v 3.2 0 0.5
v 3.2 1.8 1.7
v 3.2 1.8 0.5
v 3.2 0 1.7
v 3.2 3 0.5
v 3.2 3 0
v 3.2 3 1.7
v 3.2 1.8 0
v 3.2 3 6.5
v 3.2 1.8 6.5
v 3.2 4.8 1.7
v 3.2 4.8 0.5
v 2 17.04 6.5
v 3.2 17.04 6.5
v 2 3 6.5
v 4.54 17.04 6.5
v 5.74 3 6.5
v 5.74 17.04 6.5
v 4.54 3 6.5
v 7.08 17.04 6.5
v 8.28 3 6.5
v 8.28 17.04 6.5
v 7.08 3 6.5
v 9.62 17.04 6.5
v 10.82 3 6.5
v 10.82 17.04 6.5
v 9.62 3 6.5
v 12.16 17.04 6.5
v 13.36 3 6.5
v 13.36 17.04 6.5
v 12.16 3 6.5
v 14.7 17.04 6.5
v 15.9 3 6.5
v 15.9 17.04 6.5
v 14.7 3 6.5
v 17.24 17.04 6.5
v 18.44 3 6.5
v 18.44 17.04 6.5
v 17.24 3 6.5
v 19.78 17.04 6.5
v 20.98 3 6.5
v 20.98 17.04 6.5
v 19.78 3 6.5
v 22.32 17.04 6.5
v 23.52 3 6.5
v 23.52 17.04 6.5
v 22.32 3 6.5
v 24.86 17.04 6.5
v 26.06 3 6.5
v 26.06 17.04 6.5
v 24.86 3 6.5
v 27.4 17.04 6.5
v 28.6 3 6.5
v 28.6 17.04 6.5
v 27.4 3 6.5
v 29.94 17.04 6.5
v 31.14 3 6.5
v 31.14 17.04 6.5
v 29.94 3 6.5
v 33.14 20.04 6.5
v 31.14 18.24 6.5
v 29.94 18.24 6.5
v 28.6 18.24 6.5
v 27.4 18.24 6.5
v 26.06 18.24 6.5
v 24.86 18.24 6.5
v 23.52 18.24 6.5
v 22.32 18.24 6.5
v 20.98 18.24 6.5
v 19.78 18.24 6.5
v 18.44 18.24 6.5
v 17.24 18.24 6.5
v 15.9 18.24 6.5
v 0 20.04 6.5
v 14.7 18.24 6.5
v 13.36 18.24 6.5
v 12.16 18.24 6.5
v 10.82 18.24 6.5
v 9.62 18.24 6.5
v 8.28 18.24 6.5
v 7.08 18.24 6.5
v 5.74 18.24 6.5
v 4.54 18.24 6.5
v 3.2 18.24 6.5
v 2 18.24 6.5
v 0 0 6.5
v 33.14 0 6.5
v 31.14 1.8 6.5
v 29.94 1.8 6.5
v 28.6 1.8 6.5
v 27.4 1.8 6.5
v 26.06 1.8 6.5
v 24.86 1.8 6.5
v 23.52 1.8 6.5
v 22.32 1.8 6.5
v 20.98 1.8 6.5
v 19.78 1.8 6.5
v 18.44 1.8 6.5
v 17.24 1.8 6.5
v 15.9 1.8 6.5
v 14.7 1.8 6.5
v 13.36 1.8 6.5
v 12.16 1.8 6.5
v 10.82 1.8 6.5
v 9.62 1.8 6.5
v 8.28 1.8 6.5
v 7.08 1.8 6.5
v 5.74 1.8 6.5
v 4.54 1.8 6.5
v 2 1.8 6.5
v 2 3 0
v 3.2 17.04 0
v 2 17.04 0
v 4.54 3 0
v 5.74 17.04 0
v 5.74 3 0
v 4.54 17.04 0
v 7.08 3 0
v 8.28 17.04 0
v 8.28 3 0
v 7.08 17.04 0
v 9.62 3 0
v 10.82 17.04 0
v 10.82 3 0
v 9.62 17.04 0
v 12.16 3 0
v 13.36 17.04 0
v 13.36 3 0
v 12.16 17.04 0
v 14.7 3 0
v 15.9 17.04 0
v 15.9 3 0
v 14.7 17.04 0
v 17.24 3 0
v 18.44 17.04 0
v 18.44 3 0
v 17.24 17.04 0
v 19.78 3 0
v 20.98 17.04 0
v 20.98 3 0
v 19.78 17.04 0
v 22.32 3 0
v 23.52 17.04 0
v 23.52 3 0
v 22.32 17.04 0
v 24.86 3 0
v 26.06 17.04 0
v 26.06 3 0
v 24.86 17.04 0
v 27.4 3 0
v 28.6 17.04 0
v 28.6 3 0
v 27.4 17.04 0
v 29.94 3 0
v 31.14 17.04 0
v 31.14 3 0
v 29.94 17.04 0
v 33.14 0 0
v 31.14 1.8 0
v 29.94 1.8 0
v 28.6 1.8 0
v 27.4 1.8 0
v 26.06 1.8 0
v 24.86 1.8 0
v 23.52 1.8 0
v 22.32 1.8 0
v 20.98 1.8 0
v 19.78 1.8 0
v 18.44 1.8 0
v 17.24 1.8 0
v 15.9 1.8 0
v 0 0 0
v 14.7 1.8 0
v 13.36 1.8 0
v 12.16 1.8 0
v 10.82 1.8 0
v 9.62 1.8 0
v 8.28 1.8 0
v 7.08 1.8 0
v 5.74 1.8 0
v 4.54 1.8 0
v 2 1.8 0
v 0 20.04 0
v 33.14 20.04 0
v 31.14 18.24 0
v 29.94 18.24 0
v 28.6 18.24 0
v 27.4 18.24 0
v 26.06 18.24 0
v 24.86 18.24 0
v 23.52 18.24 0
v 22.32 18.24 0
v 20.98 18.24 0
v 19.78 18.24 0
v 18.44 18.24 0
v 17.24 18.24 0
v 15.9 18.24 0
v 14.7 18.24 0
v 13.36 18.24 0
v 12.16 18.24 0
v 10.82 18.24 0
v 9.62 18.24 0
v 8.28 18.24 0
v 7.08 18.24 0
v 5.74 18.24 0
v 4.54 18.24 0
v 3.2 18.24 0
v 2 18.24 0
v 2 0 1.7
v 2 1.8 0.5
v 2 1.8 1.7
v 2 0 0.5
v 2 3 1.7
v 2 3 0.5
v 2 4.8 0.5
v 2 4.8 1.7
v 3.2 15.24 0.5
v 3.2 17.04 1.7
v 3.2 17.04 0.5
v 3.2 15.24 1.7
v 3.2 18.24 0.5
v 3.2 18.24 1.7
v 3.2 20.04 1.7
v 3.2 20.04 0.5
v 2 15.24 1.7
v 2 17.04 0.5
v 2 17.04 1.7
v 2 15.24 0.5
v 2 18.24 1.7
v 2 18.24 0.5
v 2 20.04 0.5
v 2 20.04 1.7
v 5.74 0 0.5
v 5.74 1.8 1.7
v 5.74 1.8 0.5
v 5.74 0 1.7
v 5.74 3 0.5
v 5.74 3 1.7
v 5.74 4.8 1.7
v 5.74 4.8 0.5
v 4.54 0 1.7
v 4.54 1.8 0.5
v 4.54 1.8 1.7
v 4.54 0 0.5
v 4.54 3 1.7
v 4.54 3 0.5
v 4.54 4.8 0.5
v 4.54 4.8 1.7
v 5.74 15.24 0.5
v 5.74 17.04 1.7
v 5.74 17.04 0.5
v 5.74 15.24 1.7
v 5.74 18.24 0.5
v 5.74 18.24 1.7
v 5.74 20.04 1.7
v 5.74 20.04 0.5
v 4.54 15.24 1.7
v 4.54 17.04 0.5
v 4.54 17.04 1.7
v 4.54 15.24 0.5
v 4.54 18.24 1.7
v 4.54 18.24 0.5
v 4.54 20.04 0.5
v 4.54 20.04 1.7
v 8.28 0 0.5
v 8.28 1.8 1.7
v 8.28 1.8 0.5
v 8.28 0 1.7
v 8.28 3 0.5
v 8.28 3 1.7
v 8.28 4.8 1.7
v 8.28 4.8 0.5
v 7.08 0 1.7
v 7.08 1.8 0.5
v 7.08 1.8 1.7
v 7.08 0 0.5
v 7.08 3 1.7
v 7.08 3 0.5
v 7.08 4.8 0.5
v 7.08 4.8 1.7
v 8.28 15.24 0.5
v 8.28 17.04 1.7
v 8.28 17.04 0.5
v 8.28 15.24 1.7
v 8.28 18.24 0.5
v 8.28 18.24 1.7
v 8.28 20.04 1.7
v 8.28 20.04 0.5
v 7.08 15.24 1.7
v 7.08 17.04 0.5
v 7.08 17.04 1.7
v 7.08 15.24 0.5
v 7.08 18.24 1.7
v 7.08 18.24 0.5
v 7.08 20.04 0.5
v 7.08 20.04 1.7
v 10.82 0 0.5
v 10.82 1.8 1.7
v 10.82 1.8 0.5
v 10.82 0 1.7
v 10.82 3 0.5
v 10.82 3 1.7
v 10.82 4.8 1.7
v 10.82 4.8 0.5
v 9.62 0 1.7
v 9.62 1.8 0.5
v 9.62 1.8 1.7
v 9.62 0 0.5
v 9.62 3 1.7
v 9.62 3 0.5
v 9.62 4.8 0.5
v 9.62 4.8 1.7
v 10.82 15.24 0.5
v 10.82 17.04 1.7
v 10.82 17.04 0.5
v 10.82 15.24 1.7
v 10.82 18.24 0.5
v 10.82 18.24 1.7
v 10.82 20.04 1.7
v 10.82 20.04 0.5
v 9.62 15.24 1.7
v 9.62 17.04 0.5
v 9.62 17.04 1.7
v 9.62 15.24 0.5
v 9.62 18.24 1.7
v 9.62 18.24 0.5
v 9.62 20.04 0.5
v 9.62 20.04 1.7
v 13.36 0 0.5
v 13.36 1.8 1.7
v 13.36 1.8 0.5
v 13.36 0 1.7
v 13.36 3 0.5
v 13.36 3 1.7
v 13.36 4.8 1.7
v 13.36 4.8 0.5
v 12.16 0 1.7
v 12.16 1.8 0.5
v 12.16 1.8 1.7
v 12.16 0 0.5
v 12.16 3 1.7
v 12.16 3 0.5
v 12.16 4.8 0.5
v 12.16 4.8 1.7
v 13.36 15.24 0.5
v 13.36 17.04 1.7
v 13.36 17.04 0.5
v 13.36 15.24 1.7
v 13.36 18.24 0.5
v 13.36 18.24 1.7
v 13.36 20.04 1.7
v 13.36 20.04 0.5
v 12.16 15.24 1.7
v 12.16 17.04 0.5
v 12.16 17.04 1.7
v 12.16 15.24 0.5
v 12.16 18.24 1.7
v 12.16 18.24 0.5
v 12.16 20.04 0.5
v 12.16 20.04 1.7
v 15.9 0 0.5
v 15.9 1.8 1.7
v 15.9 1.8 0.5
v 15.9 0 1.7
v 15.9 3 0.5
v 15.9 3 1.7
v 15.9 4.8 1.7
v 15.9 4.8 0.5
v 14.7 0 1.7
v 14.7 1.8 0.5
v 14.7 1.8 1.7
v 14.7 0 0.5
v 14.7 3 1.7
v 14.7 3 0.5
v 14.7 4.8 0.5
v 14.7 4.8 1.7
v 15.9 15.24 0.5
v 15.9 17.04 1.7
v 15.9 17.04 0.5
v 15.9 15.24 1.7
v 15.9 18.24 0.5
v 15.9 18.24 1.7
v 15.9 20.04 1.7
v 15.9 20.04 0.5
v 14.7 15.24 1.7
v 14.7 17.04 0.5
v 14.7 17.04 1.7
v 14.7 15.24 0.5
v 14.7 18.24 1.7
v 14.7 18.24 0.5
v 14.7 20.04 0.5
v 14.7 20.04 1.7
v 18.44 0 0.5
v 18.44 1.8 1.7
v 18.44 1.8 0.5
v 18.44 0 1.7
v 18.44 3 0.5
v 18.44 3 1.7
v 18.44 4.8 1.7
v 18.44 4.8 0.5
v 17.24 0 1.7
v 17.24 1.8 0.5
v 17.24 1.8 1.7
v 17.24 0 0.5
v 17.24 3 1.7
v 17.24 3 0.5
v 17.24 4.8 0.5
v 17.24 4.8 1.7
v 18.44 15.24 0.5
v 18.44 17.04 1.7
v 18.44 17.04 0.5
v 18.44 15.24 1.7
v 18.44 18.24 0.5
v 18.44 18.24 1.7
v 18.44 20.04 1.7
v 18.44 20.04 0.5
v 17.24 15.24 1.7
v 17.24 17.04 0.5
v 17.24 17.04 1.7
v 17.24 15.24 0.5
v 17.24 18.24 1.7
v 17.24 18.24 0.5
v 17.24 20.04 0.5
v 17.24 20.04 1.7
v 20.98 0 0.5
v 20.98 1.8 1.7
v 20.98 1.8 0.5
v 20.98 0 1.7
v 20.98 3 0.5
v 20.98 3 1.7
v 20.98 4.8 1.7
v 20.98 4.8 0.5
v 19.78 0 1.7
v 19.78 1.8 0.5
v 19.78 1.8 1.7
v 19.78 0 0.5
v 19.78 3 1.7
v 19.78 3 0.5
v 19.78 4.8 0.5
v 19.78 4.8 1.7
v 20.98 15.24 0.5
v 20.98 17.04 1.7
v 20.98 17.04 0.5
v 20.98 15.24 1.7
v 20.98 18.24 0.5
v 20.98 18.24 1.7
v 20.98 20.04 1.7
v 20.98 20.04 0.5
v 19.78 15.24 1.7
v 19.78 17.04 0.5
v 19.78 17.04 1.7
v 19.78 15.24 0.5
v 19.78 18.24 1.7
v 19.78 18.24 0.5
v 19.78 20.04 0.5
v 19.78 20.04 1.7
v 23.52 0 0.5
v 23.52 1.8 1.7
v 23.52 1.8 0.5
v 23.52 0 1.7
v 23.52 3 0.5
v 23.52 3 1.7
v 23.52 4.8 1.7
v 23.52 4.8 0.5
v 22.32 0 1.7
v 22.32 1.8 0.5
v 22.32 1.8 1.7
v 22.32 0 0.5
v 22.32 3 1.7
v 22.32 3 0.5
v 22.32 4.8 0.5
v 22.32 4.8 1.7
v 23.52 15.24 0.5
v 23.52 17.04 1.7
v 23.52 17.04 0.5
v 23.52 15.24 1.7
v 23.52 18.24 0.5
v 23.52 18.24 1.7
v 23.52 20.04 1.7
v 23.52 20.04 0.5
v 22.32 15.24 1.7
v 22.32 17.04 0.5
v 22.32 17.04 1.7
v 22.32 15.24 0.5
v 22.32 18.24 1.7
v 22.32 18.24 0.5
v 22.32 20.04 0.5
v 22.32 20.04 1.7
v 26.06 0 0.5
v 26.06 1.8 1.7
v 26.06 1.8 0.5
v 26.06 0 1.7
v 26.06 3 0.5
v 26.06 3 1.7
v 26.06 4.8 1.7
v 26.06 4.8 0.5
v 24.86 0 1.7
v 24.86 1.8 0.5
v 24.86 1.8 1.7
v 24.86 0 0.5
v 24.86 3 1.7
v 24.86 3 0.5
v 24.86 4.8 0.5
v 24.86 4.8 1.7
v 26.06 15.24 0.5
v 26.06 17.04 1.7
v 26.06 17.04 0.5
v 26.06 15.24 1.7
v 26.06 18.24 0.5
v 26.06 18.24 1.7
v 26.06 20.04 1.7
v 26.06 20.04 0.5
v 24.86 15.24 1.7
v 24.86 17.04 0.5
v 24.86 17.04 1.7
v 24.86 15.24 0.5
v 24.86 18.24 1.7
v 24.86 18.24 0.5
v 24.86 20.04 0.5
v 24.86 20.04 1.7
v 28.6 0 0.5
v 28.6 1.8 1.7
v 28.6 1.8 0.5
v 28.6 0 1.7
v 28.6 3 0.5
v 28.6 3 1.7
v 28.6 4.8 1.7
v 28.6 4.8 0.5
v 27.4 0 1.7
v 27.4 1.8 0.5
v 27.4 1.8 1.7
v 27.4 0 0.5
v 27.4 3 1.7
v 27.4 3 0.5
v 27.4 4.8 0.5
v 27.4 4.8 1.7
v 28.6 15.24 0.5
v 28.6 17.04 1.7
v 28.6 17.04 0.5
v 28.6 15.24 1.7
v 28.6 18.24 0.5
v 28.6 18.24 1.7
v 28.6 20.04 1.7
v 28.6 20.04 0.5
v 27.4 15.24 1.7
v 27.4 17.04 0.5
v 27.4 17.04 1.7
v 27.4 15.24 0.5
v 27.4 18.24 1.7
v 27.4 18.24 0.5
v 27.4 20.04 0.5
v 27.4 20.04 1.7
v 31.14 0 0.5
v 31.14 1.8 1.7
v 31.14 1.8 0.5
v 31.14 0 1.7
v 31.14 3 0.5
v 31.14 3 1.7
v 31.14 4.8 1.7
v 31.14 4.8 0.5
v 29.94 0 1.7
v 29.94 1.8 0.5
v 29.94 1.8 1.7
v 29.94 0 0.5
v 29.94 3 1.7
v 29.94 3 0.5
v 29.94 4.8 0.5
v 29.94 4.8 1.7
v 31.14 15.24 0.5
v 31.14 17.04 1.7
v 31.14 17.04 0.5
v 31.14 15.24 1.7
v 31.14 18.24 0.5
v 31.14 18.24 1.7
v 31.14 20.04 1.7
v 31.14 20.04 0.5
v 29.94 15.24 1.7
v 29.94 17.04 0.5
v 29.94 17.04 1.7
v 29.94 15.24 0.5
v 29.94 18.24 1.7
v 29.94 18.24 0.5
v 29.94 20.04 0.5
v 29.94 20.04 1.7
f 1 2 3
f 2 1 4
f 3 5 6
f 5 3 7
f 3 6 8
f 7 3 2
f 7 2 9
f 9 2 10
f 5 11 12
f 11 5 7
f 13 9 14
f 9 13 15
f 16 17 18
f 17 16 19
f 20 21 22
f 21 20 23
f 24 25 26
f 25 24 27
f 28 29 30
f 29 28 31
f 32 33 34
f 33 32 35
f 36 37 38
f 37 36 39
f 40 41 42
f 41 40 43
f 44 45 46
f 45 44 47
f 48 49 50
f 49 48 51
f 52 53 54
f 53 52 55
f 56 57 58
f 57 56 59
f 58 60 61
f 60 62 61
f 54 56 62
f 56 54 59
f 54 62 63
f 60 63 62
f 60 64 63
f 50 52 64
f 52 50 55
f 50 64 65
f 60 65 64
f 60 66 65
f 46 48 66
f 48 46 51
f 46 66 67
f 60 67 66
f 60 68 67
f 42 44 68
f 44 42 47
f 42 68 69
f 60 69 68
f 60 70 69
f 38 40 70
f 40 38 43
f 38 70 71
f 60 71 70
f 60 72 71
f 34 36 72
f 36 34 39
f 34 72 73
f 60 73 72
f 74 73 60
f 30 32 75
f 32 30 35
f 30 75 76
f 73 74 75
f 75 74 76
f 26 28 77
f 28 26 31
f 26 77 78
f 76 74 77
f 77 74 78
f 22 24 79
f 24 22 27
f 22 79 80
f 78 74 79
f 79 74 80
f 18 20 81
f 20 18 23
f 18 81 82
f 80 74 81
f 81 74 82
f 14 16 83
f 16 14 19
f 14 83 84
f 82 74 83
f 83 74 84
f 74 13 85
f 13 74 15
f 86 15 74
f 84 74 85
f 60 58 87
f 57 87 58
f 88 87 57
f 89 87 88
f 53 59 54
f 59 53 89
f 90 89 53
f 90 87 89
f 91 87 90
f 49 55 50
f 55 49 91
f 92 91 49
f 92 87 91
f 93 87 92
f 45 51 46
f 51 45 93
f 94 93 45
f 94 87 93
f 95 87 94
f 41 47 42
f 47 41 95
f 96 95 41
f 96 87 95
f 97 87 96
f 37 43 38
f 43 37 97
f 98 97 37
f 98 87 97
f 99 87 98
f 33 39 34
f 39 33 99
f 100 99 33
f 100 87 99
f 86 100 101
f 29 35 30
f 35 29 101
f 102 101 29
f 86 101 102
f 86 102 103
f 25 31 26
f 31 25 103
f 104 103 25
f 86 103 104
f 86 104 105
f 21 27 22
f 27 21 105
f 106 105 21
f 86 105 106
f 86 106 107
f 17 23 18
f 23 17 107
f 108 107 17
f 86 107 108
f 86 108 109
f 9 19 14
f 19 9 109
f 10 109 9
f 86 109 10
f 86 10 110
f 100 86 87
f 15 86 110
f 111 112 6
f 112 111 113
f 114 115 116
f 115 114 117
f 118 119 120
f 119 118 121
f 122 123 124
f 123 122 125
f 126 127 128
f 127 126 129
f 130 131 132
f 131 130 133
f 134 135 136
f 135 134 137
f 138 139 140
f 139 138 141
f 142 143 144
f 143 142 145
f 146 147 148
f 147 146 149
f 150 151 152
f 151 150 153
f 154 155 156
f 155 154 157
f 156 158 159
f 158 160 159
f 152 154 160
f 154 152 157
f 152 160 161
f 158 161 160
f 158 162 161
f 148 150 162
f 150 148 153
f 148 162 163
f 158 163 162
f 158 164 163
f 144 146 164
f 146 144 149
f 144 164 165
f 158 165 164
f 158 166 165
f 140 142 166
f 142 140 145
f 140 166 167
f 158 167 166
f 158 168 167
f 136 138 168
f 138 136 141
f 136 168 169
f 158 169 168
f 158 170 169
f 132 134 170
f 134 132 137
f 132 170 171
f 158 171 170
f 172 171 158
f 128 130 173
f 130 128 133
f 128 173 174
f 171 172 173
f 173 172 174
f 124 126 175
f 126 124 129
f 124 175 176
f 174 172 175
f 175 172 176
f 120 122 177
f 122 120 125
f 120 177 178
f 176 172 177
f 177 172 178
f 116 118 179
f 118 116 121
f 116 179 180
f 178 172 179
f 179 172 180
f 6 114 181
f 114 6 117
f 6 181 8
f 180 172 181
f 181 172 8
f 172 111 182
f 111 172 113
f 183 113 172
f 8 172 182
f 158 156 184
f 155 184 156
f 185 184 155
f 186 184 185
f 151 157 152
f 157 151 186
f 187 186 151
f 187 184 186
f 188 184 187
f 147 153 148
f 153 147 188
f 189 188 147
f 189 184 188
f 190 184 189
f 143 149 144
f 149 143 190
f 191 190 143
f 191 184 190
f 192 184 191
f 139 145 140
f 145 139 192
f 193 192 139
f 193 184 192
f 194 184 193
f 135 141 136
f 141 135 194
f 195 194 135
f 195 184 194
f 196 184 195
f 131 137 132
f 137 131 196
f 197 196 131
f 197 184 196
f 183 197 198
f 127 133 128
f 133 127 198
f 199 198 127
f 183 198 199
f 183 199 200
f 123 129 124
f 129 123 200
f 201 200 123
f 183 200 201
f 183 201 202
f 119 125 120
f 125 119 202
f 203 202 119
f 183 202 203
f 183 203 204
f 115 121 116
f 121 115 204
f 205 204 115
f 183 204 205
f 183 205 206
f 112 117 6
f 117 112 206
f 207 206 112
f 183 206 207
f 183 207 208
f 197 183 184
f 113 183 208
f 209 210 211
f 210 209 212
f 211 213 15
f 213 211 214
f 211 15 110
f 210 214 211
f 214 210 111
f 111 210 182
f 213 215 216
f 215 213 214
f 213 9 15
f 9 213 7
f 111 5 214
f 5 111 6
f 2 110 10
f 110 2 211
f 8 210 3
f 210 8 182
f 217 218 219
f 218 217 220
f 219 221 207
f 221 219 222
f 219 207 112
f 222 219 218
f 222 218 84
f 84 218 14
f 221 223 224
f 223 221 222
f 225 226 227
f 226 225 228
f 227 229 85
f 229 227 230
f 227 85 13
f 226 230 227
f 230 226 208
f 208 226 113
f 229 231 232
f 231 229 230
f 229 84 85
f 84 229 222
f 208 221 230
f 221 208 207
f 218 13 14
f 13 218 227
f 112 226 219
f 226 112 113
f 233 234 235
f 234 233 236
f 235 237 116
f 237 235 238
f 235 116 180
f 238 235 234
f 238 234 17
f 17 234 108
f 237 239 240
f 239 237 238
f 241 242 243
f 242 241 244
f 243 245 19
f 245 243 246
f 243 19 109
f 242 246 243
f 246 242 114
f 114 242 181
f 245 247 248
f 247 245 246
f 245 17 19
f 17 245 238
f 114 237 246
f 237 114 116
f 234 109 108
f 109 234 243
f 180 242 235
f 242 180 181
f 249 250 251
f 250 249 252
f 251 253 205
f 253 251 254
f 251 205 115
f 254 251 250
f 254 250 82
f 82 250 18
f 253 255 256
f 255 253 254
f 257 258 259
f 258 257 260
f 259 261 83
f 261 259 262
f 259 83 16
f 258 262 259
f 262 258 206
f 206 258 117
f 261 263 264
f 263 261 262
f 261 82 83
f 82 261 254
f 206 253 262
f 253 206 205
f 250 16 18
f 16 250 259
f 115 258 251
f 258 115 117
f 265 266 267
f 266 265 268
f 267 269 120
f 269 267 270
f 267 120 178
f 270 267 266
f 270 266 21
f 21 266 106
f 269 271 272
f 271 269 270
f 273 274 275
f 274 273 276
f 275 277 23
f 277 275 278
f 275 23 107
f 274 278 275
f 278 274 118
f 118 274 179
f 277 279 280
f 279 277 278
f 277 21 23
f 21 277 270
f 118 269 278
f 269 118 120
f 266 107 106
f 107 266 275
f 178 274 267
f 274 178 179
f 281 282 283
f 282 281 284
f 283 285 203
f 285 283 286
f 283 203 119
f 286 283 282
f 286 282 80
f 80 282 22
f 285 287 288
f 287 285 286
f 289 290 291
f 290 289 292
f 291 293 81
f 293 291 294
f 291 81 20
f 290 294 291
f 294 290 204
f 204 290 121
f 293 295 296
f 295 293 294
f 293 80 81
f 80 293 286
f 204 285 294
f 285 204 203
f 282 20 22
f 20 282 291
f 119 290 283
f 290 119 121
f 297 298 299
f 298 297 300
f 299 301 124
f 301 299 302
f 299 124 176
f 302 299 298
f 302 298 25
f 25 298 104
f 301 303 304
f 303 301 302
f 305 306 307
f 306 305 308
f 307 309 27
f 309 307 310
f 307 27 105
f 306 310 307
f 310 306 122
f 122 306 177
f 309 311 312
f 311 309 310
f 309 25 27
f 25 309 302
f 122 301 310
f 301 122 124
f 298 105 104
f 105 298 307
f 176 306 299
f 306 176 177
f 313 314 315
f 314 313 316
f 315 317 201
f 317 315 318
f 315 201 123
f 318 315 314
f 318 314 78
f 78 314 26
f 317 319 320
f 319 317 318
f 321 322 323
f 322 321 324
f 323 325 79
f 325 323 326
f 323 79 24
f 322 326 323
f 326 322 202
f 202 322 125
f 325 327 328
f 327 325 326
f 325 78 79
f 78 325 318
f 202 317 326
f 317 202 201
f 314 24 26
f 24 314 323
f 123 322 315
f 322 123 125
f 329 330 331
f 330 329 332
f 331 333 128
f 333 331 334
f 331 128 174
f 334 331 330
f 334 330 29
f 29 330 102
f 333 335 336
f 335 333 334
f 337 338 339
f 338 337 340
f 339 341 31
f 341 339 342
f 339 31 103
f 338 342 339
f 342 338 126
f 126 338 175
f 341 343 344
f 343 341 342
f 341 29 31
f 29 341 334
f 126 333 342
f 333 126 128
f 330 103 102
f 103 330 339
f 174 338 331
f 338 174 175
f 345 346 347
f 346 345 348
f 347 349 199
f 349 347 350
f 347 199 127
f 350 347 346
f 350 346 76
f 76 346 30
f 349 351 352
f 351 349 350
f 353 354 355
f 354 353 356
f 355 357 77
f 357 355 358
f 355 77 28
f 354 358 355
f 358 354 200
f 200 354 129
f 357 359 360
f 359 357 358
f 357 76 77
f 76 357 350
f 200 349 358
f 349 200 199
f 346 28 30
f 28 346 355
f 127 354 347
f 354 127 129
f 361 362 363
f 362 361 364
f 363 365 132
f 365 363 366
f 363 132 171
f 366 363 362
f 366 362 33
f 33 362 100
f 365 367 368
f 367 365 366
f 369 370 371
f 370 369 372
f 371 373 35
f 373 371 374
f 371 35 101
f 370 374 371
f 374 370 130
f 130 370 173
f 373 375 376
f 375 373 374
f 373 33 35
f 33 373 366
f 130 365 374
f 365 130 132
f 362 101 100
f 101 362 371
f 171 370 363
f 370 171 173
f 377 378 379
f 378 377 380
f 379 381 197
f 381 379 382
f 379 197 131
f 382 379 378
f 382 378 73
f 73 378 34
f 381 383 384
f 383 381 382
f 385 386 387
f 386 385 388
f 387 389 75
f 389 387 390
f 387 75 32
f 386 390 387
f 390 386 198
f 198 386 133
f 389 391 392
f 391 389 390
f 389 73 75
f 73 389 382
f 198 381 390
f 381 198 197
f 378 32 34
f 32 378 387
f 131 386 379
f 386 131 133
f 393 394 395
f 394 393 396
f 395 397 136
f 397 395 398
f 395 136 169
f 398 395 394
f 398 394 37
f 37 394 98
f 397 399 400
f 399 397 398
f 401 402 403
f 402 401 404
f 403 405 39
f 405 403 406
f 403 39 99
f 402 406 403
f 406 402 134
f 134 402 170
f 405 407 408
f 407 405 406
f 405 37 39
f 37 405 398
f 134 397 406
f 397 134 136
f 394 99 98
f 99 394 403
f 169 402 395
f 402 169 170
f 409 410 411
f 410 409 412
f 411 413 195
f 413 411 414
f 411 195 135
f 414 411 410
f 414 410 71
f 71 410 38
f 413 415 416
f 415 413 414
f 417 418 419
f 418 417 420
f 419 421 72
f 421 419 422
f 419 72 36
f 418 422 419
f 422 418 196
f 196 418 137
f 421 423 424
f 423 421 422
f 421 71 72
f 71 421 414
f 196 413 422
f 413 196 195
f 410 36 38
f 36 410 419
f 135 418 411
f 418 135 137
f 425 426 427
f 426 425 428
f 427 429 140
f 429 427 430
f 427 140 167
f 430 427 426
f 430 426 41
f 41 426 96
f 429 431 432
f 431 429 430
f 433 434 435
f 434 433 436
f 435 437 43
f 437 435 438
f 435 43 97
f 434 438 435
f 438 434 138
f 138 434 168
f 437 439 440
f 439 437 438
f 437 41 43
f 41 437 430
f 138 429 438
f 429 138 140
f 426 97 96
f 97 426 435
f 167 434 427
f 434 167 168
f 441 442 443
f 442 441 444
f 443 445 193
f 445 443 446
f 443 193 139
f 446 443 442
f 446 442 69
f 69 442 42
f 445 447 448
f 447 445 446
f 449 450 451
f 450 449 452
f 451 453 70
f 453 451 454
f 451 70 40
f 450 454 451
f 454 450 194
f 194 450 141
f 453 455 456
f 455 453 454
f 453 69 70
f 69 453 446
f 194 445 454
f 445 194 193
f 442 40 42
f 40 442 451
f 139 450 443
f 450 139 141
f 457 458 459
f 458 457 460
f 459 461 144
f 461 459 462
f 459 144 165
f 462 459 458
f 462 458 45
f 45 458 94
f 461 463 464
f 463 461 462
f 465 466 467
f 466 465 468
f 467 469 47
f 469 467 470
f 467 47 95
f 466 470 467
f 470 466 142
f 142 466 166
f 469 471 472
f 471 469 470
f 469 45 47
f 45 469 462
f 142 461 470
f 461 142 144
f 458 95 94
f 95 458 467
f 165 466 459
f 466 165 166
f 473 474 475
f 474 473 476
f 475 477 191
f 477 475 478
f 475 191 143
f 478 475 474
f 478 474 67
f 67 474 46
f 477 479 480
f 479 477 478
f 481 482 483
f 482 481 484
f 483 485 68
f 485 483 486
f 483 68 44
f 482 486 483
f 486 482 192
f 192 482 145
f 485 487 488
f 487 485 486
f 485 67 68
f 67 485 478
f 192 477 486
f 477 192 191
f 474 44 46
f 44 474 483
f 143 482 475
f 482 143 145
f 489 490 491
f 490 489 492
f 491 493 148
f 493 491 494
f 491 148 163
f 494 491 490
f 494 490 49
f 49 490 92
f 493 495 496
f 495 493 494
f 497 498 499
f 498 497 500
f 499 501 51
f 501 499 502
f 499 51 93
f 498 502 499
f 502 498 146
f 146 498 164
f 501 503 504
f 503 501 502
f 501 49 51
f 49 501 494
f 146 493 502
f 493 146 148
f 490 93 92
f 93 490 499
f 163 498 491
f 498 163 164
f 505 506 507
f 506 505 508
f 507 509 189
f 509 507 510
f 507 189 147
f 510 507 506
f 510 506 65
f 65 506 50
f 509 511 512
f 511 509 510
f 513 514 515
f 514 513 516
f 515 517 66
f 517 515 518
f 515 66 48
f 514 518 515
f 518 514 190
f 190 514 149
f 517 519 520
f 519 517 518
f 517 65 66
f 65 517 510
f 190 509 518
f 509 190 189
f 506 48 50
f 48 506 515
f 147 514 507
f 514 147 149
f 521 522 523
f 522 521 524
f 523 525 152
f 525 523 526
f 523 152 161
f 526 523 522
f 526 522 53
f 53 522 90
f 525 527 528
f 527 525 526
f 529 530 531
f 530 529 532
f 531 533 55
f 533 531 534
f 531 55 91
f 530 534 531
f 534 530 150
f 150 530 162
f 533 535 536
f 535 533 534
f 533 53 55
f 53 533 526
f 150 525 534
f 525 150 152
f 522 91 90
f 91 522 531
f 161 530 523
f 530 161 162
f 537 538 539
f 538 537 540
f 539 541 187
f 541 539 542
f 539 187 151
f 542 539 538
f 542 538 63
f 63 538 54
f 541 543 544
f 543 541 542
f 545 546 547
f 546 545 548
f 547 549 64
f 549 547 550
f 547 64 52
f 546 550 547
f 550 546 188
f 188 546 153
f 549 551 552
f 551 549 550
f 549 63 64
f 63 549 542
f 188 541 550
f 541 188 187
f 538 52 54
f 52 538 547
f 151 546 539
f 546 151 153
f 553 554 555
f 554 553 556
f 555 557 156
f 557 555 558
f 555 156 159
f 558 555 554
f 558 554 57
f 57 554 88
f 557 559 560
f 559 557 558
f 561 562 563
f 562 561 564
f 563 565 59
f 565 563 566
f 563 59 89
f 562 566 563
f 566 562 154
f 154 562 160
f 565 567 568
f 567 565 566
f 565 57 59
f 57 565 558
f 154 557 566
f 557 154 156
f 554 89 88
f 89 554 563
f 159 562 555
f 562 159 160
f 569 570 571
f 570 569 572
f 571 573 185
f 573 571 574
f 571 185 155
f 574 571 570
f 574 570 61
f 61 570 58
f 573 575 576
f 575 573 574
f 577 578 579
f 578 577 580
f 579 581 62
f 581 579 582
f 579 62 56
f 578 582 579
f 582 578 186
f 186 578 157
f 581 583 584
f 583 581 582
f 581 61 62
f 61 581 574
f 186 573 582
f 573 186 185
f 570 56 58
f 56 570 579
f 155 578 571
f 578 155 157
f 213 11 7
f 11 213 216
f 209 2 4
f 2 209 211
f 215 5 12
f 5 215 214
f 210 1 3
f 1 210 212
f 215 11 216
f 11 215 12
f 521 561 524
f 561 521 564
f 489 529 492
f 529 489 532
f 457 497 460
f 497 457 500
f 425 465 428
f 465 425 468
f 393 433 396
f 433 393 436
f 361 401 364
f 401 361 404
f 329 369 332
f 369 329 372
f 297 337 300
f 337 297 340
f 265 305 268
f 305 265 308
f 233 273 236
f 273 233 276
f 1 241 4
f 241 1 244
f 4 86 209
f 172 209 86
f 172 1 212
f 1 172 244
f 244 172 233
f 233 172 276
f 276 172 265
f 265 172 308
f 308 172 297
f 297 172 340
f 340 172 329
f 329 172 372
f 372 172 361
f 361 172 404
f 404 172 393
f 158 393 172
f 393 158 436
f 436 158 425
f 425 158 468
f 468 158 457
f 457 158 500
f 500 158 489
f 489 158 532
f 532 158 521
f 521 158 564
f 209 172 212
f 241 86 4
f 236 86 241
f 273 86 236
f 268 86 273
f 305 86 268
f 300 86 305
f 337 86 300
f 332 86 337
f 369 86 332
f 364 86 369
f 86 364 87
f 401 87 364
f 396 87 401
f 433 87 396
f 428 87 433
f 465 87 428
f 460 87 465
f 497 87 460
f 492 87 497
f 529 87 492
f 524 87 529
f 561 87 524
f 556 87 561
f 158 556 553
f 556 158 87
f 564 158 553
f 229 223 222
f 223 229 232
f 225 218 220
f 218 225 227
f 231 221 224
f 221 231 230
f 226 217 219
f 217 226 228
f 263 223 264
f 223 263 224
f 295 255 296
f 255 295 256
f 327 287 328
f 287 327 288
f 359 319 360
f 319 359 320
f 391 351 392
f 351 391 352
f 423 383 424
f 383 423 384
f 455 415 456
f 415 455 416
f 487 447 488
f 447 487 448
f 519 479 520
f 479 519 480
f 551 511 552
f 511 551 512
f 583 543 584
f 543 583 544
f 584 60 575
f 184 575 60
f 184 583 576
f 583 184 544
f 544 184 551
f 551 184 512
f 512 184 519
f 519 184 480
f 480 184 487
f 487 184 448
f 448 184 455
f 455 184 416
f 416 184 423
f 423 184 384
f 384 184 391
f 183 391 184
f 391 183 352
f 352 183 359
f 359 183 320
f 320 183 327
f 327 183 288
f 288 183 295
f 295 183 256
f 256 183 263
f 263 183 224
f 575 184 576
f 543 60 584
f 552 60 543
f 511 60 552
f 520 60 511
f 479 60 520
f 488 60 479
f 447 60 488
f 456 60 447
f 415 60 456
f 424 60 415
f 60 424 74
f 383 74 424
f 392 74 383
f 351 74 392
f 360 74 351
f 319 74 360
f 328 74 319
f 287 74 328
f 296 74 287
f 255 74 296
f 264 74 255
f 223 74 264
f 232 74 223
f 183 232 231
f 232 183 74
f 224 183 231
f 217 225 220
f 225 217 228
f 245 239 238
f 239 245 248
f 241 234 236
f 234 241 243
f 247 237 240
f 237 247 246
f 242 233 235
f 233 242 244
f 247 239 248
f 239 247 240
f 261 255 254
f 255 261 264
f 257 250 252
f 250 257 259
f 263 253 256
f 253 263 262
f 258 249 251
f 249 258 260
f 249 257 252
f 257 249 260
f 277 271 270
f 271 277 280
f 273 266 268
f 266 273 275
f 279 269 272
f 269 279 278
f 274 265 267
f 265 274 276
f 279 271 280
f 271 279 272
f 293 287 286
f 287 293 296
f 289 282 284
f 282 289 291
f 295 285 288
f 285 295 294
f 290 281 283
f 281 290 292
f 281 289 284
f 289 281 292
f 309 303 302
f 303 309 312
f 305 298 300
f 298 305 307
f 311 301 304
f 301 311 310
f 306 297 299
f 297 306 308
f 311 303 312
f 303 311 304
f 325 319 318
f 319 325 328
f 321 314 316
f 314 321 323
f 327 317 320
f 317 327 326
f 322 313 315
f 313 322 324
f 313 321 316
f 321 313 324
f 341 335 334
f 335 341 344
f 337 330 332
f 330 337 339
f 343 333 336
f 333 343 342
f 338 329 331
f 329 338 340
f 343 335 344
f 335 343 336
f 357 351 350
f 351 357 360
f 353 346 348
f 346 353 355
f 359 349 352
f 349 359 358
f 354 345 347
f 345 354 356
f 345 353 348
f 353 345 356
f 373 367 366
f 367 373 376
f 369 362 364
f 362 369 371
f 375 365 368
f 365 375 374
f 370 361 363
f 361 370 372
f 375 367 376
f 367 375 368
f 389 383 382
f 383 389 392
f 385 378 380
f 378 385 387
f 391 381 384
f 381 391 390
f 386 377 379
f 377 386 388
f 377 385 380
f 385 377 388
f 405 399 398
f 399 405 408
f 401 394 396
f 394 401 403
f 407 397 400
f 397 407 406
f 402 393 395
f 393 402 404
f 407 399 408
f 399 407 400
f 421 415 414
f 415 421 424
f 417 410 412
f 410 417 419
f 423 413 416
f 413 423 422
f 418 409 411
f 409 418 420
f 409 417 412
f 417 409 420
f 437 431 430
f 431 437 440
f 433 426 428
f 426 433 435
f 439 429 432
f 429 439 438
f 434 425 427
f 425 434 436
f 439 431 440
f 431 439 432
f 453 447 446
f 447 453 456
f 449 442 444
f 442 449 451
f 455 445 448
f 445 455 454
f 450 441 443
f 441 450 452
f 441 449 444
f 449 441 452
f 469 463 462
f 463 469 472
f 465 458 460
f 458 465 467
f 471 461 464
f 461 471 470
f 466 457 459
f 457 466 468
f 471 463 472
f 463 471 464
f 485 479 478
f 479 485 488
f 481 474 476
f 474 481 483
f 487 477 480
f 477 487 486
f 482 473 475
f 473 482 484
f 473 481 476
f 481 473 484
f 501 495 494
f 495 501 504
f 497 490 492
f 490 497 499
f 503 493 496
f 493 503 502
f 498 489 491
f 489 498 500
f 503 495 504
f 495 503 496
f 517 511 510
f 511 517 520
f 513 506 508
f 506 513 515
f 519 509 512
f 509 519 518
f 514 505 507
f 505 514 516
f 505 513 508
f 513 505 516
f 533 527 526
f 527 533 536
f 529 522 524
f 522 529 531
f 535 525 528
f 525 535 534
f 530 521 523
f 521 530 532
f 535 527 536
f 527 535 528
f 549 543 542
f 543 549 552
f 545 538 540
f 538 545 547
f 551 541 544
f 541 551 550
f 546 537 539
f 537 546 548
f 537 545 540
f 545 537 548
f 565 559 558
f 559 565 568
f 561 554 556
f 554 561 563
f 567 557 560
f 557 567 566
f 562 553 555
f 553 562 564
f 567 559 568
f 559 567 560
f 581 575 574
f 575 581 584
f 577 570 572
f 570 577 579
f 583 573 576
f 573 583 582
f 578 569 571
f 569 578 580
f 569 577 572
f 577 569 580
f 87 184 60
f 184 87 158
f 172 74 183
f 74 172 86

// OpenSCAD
// CHANGABLE PARAMETERS
// Cube dimensions (height is fixed = 6.5mm)

/*[Input Data]*/
// Number of pins in one row
number_of_pins = 12;           // [1:1:40]
// Number of rows (1 or 2)
rows = 2;                       // [1,2]

// whichever suits you (for Arduino Micro is 15.24)
row_distance = 15.24;
// square length and width (depends on printer accuracy) 
pin_hole_dim = 1.20; 		    // [1:0.05:1.50] 


// OPTIONALLY CHANGABLE PARAMETERS
// offset between pins (usually 2.54mm)
pin_offset = 2.54;   

// pin distance from edge of adapter
x_offset_from_edge = 2;
// pin distance from edge of adapter
y_offset_from_edge = 1.8;  		
// wire hole offset from bottom edge
z_offset_from_edge = 0.5;  // [0.5:0.1:1.0] 

/* [Hidden] */
// FIXED OR COMPUTED PARAMETERS
length = (2 * x_offset_from_edge) + ((number_of_pins - 1) * pin_offset) + pin_hole_dim;
width = (2 * y_offset_from_edge) + pin_hole_dim + (rows - 1) * row_distance;

// Draw object
draw(number_of_pins, rows, row_distance, pin_hole_dim, pin_offset, x_offset_from_edge, y_offset_from_edge, z_offset_from_edge, length, width); 

// Definition of the module
module draw (npin, nrow, rowdist, pindim, pinoff, xoff, yoff, zoff, nlength, nwidth){
    render(convexity = 2) 
    difference(){
        cube([nlength, nwidth, 6.5]);
            
        // cut holes for pins
        for(i = [0:pinoff:(npin - 1) * pinoff]){
            for(j = [0:rowdist:(nrow - 1) * rowdist]){
                translate([xoff + i, yoff + j, 0]) 
                cube([pindim, pindim, 6.5]);
                //color("cyan");
            }
        }
        
        // cut holes for wires
        for(i = [0:pinoff:(npin - 1) * pinoff]){
            for(j = [0:rowdist:(nrow - 1) * rowdist]){
                translate([xoff + i, j, z_offset_from_edge])   // if connection with wire is loose, insreace distance from 0.5 to (not more than) 1mm
                cube([pindim, 2 * yoff + pindim, pindim]);
                //color("red");
            }
        }
    }
};
